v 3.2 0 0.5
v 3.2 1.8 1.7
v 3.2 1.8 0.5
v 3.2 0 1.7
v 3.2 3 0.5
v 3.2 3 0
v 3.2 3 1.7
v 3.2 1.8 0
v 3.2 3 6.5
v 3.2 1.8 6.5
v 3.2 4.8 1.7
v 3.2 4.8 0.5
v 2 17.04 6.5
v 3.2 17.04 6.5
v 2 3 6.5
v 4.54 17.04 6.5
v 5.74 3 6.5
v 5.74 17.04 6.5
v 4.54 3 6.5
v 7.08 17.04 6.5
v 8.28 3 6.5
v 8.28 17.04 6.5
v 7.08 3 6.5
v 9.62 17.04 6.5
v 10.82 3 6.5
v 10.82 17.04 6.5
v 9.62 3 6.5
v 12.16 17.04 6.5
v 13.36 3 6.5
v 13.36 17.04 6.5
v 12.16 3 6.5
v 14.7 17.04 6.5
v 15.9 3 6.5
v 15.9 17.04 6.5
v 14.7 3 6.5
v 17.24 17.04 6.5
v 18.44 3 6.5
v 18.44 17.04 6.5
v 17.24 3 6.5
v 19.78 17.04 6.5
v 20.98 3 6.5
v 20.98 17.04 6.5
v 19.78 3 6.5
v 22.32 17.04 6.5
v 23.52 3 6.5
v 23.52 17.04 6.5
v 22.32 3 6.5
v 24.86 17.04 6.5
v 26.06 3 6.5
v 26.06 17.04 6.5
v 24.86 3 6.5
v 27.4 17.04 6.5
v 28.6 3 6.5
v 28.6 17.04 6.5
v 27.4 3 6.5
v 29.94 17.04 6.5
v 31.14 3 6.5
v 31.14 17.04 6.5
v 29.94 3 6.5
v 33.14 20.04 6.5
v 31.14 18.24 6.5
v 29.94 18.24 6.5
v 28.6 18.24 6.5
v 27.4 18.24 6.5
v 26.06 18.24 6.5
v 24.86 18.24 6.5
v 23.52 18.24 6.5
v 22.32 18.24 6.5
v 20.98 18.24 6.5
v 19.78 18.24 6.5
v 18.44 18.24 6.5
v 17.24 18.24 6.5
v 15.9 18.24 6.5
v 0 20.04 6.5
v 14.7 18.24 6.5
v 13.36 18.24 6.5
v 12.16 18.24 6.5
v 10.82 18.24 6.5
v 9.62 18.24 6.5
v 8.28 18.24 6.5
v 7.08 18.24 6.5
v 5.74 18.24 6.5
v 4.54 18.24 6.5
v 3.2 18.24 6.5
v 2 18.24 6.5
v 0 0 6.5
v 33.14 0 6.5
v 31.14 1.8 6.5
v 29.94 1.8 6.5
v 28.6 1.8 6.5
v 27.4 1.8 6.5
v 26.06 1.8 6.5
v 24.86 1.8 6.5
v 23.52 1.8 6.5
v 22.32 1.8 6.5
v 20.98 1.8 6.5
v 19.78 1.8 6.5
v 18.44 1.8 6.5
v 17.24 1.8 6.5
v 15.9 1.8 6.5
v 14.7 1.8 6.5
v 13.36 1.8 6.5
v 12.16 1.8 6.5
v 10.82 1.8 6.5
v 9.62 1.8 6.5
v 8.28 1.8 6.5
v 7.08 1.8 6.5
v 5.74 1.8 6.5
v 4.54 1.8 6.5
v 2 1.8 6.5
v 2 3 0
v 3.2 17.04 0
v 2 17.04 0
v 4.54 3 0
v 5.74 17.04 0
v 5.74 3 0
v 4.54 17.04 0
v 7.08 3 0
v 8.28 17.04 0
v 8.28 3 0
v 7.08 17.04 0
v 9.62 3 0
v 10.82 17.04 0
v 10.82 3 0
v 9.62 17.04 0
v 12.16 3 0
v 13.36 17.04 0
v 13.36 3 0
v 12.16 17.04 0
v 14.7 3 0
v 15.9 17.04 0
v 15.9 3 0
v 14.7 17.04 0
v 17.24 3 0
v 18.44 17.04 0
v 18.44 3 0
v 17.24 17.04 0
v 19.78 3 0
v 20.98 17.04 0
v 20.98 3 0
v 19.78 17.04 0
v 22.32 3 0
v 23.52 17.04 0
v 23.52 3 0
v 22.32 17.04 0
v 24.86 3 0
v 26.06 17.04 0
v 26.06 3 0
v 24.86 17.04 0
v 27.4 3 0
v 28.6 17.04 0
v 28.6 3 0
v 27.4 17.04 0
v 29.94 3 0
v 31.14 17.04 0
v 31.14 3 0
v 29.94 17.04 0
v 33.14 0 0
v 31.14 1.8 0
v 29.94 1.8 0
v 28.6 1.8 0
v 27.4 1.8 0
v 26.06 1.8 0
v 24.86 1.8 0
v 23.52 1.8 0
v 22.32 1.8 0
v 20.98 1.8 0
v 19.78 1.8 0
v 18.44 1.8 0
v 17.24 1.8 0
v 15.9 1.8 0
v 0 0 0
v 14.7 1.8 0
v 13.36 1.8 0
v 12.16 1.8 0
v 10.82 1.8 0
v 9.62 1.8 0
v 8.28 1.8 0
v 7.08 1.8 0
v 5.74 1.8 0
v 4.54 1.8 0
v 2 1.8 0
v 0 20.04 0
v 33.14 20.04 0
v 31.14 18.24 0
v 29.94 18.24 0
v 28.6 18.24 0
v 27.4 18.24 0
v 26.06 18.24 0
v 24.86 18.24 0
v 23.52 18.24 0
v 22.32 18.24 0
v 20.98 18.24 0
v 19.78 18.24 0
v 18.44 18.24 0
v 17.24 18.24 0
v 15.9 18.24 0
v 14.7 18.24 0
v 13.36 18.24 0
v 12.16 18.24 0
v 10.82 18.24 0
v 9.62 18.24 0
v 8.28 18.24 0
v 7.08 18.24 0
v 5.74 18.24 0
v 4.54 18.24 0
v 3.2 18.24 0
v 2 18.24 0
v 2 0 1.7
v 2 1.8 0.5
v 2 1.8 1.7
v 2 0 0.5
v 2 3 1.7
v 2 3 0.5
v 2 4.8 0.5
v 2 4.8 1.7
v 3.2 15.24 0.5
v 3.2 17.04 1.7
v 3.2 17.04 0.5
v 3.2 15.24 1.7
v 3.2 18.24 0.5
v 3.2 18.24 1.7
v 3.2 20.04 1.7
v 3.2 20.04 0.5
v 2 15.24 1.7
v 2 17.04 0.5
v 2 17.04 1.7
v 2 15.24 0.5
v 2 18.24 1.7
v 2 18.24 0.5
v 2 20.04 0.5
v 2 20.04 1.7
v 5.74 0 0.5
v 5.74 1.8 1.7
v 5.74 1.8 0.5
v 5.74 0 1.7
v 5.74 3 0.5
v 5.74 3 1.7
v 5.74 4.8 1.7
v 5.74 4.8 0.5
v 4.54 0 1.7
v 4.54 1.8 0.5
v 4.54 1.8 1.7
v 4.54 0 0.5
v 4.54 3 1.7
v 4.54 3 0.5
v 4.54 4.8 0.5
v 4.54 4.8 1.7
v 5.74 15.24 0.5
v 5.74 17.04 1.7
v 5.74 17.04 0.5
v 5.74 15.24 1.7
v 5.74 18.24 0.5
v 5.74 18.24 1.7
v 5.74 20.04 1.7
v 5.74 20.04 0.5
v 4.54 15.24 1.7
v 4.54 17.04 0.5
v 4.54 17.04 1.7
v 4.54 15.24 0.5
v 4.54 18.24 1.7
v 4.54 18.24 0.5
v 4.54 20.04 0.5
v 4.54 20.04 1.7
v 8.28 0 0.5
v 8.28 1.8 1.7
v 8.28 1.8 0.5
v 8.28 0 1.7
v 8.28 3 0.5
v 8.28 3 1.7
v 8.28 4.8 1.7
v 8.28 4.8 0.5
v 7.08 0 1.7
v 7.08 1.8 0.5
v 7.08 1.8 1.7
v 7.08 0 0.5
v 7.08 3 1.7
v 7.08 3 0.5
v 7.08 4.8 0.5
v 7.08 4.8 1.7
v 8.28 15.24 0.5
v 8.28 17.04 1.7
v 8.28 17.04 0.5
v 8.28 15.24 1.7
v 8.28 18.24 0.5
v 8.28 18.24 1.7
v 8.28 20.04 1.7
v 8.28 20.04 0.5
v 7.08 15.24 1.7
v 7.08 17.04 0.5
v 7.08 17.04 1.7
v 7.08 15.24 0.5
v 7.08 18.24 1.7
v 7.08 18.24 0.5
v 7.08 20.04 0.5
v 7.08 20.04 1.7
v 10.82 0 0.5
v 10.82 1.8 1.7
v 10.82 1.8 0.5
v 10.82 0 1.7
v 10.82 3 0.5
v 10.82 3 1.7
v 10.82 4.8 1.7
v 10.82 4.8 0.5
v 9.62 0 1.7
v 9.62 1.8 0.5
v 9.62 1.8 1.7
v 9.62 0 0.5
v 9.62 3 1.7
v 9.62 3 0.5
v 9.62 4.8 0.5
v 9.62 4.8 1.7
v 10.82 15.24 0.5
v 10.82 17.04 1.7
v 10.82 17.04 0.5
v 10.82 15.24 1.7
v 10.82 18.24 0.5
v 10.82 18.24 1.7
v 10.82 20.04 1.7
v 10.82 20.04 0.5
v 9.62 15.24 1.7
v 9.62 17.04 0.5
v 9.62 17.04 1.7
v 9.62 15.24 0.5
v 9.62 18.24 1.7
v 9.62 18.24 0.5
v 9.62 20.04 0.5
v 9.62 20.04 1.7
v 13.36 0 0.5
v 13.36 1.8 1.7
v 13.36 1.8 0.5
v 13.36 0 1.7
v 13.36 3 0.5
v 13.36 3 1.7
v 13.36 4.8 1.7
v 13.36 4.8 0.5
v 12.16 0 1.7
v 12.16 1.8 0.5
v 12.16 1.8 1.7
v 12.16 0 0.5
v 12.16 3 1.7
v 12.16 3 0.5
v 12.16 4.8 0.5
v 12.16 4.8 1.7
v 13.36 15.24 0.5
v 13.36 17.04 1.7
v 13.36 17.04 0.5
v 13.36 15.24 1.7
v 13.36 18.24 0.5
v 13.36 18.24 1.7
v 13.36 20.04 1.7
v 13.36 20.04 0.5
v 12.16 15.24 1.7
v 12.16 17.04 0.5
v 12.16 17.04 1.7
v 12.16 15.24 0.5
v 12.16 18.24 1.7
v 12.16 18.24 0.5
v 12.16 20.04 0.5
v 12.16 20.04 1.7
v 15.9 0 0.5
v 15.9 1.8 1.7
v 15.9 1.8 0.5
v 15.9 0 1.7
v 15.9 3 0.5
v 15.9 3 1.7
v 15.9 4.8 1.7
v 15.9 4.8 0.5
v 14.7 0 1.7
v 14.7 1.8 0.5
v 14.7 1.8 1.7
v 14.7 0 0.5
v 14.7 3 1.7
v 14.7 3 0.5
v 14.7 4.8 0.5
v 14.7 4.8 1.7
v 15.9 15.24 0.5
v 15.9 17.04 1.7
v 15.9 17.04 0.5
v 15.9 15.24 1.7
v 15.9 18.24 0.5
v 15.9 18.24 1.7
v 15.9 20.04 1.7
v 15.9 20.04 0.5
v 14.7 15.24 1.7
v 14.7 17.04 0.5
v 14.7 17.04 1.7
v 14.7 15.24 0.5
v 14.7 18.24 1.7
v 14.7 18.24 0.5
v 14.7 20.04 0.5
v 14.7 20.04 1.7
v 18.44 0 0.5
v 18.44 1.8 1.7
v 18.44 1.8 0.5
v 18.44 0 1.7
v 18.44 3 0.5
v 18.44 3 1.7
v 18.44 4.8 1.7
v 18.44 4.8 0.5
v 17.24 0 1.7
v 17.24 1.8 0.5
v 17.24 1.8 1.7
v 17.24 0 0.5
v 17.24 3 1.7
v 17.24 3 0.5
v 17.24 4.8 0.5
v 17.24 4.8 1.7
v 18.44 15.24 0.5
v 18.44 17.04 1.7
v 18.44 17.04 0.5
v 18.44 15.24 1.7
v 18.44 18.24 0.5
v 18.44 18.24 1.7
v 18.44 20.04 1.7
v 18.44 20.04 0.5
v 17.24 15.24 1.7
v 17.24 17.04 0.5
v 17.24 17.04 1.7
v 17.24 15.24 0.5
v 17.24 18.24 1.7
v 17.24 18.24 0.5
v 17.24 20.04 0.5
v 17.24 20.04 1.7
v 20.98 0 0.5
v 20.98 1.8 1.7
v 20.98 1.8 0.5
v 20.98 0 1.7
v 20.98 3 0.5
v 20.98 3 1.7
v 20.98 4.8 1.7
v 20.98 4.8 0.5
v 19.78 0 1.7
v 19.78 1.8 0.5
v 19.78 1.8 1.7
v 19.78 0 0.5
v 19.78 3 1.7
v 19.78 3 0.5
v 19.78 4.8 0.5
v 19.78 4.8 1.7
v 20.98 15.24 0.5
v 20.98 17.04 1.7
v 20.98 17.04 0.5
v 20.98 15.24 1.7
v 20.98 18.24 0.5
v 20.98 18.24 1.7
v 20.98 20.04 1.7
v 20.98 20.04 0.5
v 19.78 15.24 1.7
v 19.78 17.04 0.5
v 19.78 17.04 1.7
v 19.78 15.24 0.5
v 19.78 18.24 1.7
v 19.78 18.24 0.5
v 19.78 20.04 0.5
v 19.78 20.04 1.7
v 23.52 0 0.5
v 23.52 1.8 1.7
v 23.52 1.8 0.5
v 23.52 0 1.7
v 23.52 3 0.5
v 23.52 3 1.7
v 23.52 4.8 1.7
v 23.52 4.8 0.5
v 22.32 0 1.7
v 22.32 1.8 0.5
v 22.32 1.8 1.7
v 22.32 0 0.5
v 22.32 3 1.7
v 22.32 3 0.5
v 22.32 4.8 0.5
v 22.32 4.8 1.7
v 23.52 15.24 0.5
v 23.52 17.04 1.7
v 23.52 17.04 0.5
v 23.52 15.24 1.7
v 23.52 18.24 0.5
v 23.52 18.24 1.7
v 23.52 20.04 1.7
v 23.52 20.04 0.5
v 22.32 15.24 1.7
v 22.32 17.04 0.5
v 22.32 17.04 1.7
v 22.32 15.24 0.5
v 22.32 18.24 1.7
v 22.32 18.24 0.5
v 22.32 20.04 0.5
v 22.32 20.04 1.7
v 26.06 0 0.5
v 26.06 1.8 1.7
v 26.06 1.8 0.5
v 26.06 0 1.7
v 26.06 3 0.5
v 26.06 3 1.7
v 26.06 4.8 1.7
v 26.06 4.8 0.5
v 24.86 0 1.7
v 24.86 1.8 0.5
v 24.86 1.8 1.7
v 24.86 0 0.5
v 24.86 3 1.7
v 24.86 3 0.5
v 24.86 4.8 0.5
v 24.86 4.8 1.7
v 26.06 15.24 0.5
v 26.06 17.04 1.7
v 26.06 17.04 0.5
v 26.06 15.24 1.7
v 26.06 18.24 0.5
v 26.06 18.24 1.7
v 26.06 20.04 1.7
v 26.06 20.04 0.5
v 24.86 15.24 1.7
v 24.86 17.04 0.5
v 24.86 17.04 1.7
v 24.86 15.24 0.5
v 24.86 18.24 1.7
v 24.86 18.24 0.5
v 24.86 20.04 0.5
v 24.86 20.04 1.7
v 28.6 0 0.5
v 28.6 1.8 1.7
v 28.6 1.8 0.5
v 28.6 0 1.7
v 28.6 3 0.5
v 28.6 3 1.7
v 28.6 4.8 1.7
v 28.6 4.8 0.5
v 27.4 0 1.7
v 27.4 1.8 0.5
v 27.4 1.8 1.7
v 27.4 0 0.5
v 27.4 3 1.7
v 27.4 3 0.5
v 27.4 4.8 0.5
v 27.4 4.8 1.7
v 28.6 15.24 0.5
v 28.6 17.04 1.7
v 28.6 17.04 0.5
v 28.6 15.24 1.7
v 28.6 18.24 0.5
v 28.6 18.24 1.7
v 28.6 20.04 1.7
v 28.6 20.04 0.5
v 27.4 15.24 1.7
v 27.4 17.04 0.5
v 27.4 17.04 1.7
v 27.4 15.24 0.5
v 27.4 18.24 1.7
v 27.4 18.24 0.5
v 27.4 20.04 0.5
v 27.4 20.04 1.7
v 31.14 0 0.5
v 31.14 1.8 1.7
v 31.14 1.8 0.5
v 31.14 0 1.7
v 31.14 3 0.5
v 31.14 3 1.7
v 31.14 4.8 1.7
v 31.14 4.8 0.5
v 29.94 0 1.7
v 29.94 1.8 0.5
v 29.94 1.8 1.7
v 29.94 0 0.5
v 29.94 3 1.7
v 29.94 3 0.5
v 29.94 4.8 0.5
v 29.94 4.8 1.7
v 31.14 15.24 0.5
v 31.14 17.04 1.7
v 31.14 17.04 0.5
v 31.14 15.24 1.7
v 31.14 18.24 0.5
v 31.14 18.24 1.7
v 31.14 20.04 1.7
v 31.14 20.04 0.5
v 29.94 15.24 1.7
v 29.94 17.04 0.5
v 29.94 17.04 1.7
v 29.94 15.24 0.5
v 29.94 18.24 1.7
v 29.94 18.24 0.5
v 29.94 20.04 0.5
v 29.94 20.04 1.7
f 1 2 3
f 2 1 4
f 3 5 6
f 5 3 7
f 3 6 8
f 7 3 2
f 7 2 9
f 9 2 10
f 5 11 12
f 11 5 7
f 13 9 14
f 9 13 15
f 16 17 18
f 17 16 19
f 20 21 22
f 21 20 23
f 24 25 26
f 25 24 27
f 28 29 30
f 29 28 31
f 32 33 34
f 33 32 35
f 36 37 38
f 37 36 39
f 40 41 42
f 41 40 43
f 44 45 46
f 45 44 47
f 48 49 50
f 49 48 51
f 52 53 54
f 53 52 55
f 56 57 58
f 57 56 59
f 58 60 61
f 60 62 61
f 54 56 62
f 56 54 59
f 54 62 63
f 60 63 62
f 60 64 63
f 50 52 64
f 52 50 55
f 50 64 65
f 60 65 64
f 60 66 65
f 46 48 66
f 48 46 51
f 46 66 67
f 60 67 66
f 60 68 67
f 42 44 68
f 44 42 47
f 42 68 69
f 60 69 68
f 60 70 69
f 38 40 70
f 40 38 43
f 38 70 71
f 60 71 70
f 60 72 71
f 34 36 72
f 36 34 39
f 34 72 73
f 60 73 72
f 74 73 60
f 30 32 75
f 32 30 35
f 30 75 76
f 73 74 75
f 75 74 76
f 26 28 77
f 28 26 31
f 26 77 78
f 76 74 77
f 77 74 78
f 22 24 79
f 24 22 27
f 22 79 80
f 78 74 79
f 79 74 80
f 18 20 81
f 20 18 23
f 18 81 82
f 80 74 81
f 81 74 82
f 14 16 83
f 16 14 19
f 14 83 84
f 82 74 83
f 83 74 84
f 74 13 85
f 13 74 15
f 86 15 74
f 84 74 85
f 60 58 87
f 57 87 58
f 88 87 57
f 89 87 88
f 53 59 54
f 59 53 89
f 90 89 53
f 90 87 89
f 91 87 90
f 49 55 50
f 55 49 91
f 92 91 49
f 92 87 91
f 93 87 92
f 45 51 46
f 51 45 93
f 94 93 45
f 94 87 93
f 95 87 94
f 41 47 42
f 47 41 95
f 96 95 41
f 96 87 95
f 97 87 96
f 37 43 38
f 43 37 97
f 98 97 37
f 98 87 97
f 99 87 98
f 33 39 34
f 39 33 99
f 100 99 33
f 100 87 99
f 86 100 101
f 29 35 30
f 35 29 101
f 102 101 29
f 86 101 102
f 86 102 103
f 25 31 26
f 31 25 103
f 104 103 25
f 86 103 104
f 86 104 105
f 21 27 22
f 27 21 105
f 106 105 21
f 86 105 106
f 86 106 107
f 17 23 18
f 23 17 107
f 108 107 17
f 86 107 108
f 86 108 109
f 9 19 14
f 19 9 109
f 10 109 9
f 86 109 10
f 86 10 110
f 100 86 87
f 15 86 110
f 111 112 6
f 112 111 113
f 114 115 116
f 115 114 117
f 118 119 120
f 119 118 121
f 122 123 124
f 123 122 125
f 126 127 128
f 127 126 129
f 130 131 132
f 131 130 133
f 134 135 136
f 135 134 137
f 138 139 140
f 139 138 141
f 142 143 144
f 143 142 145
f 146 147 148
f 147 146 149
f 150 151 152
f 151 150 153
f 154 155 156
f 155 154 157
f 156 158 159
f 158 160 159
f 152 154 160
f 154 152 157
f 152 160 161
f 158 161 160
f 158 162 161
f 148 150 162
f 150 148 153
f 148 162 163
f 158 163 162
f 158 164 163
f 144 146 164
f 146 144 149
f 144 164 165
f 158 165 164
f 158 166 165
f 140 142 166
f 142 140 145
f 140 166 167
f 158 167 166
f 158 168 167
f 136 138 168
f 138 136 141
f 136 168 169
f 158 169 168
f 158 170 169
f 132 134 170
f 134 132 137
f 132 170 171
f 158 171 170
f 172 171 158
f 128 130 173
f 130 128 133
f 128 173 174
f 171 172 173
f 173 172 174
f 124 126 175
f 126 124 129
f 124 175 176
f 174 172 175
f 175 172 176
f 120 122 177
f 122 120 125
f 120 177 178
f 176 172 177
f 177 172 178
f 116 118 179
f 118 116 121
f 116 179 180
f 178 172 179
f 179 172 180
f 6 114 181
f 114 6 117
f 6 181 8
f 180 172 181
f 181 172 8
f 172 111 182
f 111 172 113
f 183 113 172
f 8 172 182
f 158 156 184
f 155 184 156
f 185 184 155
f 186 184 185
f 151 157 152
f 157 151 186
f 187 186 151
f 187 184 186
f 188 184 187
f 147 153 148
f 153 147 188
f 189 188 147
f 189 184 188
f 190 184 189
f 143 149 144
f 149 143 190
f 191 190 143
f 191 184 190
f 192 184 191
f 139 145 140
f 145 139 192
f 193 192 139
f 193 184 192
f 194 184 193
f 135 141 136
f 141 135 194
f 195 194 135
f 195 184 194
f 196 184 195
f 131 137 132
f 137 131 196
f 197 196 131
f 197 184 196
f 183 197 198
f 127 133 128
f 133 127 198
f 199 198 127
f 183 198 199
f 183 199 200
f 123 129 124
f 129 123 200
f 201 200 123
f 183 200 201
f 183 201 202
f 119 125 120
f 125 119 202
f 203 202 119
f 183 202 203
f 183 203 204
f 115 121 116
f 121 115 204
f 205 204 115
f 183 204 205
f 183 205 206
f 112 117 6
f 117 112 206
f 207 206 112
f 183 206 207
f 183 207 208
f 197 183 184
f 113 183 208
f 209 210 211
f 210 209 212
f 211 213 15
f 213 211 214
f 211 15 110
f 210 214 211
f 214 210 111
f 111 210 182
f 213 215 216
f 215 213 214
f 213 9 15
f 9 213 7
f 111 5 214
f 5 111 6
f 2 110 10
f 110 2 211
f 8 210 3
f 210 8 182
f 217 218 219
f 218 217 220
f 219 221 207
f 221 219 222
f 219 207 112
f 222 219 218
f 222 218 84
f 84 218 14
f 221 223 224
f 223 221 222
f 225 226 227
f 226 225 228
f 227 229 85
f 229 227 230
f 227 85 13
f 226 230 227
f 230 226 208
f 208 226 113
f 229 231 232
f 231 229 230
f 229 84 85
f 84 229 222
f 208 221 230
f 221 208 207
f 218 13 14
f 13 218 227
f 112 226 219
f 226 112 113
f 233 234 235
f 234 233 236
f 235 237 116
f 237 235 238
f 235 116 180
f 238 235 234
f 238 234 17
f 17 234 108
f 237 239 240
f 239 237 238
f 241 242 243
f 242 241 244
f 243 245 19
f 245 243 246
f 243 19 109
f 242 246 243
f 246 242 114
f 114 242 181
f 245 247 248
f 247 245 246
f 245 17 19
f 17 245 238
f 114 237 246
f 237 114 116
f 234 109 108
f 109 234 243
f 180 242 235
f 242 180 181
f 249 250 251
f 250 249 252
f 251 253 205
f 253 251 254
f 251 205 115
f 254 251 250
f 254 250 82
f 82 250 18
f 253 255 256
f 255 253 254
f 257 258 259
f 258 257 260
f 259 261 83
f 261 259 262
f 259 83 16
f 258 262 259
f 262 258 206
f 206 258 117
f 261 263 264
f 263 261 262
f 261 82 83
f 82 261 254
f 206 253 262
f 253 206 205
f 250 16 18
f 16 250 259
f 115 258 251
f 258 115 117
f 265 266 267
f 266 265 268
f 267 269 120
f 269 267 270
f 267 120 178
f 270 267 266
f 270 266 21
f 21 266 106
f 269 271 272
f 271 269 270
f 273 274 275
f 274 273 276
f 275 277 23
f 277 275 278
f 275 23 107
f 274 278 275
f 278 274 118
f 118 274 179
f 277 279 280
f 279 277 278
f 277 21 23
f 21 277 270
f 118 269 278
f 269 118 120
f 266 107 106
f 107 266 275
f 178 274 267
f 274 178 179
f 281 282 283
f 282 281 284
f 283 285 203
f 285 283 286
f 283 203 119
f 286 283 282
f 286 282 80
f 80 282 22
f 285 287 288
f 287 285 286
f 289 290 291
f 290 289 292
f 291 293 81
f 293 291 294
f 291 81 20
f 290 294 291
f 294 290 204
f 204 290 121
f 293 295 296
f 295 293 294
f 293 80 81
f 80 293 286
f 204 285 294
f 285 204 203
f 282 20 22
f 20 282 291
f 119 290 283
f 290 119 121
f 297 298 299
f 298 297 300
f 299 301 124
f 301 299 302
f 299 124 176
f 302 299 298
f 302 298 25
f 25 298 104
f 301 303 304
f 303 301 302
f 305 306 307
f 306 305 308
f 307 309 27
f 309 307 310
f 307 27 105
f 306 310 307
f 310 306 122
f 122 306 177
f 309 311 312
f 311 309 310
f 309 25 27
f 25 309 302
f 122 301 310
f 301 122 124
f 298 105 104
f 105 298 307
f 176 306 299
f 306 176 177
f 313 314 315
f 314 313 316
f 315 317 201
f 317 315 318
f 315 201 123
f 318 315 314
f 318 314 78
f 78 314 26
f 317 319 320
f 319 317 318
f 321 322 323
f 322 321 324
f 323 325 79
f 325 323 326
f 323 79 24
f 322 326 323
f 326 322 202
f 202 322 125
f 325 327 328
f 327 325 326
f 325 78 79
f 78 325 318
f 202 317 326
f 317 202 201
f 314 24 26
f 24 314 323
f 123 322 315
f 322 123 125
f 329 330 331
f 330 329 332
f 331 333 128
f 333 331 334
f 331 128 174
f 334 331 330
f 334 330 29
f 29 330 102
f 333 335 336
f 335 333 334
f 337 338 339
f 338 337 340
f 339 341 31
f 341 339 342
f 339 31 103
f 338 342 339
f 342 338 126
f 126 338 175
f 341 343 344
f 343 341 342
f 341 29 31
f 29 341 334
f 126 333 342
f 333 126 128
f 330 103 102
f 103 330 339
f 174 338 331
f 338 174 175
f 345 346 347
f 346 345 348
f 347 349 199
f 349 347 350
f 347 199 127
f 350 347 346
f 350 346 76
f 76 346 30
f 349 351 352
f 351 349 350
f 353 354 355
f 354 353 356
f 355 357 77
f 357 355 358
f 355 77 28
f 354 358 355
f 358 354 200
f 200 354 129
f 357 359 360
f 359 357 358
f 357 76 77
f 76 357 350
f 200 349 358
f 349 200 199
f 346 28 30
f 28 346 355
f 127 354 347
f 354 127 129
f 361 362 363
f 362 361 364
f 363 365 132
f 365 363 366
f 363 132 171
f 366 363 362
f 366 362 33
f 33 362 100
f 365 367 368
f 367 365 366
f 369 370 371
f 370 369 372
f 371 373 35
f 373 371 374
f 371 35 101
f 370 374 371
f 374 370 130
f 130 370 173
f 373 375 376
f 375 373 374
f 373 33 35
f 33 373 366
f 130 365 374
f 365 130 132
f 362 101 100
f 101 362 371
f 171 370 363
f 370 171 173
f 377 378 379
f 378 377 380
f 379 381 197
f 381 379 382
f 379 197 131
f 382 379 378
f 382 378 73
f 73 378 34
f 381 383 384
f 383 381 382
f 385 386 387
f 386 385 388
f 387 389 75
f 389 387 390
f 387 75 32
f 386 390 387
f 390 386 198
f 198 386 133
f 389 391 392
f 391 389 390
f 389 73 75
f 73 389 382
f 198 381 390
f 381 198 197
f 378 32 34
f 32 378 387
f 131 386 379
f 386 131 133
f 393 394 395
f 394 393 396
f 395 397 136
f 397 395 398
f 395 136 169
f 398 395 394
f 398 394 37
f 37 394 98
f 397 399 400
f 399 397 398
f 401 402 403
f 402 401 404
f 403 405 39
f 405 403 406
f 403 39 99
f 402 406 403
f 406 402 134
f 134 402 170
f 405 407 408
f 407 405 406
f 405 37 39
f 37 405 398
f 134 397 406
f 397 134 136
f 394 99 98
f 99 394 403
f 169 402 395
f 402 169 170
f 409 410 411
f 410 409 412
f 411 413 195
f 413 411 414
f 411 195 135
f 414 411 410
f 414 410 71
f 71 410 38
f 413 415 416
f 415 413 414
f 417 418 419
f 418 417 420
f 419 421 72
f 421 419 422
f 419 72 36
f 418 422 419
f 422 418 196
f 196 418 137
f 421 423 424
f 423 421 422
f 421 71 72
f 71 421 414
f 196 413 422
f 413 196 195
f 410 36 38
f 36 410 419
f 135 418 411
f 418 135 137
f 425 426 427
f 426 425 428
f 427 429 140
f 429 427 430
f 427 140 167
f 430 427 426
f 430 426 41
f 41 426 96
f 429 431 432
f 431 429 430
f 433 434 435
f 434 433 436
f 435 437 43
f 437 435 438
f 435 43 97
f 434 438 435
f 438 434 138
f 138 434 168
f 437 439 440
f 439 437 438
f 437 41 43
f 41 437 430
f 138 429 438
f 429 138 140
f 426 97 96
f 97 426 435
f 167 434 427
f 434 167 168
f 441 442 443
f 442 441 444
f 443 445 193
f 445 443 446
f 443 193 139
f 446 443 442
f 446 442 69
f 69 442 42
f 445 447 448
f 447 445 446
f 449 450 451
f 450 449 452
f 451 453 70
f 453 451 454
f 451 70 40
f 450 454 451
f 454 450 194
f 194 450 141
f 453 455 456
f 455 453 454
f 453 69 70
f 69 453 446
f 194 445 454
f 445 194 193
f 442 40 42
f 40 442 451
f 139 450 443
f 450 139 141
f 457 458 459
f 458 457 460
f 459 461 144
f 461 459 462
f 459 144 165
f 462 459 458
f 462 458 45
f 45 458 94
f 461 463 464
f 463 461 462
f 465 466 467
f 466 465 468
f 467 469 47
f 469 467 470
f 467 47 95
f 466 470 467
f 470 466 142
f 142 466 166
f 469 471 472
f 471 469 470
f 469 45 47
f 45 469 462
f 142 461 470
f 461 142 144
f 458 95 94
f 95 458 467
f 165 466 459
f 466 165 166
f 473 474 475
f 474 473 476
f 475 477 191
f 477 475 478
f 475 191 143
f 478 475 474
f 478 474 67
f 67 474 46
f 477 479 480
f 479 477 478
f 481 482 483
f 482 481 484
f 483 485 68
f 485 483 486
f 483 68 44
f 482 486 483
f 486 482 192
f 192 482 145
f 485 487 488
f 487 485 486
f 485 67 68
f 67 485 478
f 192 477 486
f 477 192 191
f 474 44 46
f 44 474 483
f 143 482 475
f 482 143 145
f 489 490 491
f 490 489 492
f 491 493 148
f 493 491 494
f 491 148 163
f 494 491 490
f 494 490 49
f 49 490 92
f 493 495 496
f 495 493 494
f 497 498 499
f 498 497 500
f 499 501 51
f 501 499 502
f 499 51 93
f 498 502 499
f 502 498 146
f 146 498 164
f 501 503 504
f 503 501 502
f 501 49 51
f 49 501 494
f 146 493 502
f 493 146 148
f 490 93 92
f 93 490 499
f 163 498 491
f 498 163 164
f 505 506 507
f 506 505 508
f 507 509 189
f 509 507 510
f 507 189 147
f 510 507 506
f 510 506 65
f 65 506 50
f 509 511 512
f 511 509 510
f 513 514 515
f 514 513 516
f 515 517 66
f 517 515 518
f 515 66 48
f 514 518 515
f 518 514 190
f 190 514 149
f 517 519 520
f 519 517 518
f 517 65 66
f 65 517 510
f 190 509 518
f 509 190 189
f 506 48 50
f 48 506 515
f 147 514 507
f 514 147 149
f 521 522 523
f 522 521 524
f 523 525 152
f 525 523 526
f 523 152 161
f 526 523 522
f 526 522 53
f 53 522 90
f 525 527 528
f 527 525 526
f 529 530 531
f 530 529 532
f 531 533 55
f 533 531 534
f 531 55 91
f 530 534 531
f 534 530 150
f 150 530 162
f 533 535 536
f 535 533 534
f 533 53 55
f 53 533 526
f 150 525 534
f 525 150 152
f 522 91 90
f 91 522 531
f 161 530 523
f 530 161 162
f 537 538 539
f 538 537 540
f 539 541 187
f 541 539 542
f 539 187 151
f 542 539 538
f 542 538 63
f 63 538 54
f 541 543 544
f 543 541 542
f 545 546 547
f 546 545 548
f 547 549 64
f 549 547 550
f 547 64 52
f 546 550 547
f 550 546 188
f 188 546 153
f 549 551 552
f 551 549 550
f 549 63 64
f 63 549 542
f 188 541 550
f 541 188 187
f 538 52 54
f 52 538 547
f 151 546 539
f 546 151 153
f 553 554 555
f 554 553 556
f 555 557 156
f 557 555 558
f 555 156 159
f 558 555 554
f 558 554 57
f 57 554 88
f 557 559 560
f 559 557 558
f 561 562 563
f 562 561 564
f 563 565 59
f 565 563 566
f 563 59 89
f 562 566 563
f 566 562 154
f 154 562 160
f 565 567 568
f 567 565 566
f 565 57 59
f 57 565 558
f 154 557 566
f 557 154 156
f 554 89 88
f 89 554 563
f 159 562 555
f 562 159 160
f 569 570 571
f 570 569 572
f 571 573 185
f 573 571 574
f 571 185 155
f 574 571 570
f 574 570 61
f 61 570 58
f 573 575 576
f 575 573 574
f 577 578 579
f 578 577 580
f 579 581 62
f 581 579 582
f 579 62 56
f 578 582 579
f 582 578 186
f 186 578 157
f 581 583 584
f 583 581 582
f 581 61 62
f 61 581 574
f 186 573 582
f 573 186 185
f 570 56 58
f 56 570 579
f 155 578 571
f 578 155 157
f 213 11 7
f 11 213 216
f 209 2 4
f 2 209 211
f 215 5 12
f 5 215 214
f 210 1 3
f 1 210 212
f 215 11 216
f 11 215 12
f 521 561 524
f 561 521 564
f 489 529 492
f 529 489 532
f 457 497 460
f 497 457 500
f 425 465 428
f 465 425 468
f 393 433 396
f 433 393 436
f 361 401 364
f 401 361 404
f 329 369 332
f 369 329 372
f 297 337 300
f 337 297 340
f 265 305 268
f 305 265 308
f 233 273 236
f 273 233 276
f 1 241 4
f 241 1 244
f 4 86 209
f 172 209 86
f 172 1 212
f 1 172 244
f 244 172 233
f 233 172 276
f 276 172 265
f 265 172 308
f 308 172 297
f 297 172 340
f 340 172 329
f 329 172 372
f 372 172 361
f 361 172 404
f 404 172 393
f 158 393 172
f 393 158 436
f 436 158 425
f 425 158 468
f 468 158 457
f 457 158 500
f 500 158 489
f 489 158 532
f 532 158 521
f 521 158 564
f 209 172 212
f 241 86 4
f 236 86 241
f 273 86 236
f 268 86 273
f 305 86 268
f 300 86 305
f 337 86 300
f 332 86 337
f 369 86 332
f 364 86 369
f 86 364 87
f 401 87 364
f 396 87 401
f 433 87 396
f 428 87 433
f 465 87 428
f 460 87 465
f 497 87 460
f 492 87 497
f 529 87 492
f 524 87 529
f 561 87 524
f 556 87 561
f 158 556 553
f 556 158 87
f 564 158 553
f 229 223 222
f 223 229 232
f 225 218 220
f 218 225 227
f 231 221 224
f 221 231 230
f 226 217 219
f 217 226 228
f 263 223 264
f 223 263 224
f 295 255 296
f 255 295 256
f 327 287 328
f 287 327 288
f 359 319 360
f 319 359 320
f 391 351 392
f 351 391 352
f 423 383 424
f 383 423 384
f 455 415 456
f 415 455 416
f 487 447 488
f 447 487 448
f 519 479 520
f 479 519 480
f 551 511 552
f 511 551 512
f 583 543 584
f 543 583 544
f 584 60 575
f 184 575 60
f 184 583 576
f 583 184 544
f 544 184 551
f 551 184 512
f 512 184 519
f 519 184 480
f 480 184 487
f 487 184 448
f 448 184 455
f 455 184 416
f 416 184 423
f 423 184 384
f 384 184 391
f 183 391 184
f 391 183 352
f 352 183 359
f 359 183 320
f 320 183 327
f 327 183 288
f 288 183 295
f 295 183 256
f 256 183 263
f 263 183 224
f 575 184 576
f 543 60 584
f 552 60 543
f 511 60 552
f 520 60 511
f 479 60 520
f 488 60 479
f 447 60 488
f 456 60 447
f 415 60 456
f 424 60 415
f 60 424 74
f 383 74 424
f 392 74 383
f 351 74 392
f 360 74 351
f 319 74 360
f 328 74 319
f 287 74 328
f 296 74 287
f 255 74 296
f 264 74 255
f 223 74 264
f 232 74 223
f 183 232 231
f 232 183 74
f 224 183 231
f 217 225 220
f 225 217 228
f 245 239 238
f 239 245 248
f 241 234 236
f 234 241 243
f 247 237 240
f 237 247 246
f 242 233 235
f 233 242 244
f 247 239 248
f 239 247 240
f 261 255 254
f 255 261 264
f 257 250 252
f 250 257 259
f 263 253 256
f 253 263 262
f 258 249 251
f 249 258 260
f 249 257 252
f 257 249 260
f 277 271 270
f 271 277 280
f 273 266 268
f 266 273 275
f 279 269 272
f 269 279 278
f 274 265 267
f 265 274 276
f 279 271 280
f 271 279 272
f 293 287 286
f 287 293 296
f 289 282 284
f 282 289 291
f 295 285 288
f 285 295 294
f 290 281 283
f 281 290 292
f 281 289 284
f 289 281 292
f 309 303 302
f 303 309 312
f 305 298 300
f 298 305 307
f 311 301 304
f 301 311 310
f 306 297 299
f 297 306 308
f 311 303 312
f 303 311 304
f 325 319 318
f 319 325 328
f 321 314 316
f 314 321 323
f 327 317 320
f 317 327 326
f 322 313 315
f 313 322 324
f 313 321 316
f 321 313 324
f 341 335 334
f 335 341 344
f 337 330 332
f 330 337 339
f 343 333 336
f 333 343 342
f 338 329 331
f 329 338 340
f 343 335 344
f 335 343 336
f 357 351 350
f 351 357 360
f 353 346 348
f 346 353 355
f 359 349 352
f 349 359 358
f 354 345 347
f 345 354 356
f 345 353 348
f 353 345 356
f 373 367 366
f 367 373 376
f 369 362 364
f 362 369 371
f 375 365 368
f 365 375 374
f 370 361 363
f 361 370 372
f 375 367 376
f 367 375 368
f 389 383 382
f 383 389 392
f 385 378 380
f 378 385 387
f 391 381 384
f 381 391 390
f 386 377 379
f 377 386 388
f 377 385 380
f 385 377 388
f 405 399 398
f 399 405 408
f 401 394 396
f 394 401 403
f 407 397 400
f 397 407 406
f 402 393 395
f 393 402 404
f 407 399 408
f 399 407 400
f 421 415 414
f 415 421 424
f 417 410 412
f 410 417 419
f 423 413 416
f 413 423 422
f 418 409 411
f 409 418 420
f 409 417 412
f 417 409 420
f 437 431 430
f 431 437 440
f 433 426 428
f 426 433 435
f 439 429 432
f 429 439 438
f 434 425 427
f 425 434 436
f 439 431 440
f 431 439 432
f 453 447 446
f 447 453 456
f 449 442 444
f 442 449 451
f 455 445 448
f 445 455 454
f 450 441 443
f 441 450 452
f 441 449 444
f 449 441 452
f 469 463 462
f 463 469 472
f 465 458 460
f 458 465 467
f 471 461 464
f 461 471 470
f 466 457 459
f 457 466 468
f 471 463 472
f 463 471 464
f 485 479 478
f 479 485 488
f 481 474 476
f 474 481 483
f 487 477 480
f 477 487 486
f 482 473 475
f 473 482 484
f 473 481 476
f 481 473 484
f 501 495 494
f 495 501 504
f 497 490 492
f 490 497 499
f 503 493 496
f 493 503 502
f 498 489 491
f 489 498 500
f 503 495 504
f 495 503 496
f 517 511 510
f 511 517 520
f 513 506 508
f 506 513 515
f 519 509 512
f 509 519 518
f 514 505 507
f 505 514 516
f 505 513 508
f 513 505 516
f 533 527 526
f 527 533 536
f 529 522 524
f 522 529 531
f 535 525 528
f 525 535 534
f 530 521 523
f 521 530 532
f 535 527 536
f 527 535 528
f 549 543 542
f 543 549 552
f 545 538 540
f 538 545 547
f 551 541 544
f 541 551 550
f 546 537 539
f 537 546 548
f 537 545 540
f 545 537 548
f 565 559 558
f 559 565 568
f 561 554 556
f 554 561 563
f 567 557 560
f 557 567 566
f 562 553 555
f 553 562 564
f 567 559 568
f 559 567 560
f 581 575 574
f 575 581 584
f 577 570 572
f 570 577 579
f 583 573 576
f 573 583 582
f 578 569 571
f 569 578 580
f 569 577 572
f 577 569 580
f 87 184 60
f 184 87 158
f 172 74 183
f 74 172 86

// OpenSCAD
// CHANGABLE PARAMETERS
// Cube dimensions (height is fixed = 6.5mm)

/*[Input Data]*/
// Number of pins in one row
number_of_pins = 12;           // [1:1:40]
// Number of rows (1 or 2)
rows = 2;                       // [1,2]

// whichever suits you (for Arduino Micro is 15.24)
row_distance = 15.24;
// square length and width (depends on printer accuracy) 
pin_hole_dim = 1.20; 		    // [1:0.05:1.50] 


// OPTIONALLY CHANGABLE PARAMETERS
// offset between pins (usually 2.54mm)
pin_offset = 2.54;   

// pin distance from edge of adapter
x_offset_from_edge = 2;
// pin distance from edge of adapter
y_offset_from_edge = 1.8;  		
// wire hole offset from bottom edge
z_offset_from_edge = 0.5;  // [0.5:0.1:1.0] 

/* [Hidden] */
// FIXED OR COMPUTED PARAMETERS
length = (2 * x_offset_from_edge) + ((number_of_pins - 1) * pin_offset) + pin_hole_dim;
width = (2 * y_offset_from_edge) + pin_hole_dim + (rows - 1) * row_distance;

// Draw object
draw(number_of_pins, rows, row_distance, pin_hole_dim, pin_offset, x_offset_from_edge, y_offset_from_edge, z_offset_from_edge, length, width); 

// Definition of the module
module draw (npin, nrow, rowdist, pindim, pinoff, xoff, yoff, zoff, nlength, nwidth){
    render(convexity = 2) 
    difference(){
        cube([nlength, nwidth, 6.5]);
            
        // cut holes for pins
        for(i = [0:pinoff:(npin - 1) * pinoff]){
            for(j = [0:rowdist:(nrow - 1) * rowdist]){
                translate([xoff + i, yoff + j, 0]) 
                cube([pindim, pindim, 6.5]);
                //color("cyan");
            }
        }
        
        // cut holes for wires
        for(i = [0:pinoff:(npin - 1) * pinoff]){
            for(j = [0:rowdist:(nrow - 1) * rowdist]){
                translate([xoff + i, j, z_offset_from_edge])   // if connection with wire is loose, insreace distance from 0.5 to (not more than) 1mm
                cube([pindim, 2 * yoff + pindim, pindim]);
                //color("red");
            }
        }
    }
};
